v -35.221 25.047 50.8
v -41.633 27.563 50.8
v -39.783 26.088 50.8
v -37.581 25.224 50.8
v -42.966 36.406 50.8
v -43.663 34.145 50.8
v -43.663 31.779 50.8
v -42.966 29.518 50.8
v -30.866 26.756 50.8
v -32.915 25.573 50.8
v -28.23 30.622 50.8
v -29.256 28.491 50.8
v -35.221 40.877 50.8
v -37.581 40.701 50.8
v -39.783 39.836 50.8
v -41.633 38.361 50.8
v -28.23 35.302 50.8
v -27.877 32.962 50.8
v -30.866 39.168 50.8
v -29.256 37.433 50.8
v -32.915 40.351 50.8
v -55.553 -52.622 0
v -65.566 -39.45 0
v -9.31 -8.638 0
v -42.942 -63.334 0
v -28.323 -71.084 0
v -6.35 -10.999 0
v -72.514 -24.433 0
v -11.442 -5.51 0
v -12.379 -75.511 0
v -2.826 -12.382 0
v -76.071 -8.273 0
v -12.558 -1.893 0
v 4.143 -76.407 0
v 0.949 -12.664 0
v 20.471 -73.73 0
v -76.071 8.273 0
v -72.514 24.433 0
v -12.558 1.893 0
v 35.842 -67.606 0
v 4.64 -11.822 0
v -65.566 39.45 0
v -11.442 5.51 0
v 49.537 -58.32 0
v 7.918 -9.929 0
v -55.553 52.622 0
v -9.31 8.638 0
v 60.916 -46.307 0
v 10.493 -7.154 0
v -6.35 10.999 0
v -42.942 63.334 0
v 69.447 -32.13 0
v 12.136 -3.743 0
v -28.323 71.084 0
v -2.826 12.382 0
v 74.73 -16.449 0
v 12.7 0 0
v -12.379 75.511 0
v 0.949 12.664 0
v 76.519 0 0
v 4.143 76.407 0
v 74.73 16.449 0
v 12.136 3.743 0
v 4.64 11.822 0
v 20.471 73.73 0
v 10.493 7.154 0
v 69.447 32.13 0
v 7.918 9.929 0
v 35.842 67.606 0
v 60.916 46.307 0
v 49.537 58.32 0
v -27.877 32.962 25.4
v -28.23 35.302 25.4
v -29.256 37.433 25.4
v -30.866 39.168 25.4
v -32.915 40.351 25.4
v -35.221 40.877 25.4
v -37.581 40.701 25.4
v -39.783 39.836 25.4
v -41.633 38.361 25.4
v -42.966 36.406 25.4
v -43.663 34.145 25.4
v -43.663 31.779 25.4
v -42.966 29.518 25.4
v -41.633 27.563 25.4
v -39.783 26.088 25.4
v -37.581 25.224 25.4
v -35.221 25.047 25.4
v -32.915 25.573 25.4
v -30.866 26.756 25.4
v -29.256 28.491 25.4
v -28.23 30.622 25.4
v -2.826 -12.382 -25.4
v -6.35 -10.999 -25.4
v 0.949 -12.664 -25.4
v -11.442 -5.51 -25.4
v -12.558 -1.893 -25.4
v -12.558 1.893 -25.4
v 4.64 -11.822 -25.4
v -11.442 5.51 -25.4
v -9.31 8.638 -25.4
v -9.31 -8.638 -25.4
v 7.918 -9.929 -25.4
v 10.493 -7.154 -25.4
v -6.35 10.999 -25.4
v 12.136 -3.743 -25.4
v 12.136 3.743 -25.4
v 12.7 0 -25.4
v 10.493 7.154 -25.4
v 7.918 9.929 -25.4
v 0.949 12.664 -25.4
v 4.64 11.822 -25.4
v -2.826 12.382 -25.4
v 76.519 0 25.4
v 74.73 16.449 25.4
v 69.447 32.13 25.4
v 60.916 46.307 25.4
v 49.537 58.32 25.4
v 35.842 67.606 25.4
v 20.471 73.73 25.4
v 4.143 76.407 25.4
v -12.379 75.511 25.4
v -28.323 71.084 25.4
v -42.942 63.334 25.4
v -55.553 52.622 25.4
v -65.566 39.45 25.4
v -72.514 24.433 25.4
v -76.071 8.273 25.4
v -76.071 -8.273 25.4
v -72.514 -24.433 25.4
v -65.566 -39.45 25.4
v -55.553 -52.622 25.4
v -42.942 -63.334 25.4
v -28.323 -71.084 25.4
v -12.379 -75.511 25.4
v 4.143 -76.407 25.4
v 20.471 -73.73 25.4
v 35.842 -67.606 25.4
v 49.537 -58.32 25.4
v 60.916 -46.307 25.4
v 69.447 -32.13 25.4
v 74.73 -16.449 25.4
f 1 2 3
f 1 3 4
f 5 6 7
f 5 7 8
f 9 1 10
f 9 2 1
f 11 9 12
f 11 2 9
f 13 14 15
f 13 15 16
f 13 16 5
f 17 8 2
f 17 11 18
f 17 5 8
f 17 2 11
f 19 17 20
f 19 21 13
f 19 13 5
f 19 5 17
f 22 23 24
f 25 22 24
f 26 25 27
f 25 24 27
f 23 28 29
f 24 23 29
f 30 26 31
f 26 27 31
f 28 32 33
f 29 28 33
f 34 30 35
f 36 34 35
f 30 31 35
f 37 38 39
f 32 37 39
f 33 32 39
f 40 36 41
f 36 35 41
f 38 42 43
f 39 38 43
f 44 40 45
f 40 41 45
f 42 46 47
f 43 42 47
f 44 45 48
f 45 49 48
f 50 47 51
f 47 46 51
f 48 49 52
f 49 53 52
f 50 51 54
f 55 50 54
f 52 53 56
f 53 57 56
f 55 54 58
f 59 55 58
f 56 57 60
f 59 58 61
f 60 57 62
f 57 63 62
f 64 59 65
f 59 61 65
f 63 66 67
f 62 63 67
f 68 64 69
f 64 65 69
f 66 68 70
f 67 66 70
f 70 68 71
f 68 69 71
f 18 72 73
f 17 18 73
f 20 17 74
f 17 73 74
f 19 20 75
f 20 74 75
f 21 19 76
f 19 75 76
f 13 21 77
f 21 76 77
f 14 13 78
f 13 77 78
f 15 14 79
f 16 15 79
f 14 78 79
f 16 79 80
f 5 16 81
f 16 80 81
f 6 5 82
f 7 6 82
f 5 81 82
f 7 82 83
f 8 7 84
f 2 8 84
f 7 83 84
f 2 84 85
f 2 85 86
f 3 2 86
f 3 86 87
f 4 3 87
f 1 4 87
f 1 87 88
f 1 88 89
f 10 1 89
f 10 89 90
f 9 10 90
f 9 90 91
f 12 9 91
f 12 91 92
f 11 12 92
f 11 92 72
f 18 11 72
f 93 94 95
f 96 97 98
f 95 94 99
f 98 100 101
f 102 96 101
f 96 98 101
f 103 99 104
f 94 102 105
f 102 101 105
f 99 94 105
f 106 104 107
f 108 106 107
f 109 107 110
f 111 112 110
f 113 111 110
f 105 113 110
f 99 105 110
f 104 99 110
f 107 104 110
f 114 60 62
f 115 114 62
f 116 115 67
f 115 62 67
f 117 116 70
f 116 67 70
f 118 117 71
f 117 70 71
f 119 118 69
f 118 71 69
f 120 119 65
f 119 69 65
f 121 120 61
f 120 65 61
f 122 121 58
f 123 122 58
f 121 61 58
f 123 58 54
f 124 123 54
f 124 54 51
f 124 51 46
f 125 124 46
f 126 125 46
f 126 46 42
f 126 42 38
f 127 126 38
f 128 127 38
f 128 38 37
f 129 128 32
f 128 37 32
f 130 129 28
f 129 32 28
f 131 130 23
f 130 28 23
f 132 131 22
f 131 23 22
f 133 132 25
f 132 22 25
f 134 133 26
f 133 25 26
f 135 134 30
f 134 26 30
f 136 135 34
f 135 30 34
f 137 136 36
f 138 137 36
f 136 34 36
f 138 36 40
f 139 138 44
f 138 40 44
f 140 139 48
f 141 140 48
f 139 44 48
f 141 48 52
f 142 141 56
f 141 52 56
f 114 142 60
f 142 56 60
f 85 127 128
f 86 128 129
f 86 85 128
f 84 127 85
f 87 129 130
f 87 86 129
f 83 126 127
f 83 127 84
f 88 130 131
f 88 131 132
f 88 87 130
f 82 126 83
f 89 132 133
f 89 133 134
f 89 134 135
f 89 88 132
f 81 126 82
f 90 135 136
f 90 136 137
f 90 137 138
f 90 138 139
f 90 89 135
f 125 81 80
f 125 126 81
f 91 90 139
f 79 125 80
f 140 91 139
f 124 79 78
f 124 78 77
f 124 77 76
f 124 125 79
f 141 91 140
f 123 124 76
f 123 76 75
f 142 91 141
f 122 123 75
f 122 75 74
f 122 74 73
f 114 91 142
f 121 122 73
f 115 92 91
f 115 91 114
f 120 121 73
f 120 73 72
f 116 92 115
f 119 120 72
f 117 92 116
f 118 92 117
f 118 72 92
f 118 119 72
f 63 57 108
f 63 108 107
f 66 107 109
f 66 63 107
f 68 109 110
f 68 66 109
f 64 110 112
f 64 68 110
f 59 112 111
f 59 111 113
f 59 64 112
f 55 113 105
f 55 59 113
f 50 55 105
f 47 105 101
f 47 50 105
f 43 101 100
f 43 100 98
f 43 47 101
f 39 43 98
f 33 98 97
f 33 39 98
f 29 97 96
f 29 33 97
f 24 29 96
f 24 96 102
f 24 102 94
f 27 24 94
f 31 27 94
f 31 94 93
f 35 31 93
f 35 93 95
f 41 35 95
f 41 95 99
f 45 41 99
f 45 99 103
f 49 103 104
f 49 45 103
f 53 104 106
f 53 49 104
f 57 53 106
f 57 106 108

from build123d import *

# Parameters (mm, degrees)
F0_R     = 76.51913
F1_DEPTH = 25.4
F2_R     = 7.9375
F3_DEPTH = 50.8
F4_R     = 12.7
F5_DEPTH = 25.4


with BuildPart() as f1:
    # F0 (on Top) → F1 (new body)
    with BuildSketch(Plane.XY):
        Circle(F0_R)
    extrude(amount=F1_DEPTH)

    # F2 (on Top) → F3 (join)
    with BuildSketch(Plane.XY):
        with Locations((-35.814576, 32.962088)):
            Circle(F2_R)
    extrude(amount=F3_DEPTH)

    # F4 (on Top) → F5 (join)
    with BuildSketch(Plane.XY):
        Circle(F4_R)
    extrude(amount=-F5_DEPTH)


solid = f1.part
